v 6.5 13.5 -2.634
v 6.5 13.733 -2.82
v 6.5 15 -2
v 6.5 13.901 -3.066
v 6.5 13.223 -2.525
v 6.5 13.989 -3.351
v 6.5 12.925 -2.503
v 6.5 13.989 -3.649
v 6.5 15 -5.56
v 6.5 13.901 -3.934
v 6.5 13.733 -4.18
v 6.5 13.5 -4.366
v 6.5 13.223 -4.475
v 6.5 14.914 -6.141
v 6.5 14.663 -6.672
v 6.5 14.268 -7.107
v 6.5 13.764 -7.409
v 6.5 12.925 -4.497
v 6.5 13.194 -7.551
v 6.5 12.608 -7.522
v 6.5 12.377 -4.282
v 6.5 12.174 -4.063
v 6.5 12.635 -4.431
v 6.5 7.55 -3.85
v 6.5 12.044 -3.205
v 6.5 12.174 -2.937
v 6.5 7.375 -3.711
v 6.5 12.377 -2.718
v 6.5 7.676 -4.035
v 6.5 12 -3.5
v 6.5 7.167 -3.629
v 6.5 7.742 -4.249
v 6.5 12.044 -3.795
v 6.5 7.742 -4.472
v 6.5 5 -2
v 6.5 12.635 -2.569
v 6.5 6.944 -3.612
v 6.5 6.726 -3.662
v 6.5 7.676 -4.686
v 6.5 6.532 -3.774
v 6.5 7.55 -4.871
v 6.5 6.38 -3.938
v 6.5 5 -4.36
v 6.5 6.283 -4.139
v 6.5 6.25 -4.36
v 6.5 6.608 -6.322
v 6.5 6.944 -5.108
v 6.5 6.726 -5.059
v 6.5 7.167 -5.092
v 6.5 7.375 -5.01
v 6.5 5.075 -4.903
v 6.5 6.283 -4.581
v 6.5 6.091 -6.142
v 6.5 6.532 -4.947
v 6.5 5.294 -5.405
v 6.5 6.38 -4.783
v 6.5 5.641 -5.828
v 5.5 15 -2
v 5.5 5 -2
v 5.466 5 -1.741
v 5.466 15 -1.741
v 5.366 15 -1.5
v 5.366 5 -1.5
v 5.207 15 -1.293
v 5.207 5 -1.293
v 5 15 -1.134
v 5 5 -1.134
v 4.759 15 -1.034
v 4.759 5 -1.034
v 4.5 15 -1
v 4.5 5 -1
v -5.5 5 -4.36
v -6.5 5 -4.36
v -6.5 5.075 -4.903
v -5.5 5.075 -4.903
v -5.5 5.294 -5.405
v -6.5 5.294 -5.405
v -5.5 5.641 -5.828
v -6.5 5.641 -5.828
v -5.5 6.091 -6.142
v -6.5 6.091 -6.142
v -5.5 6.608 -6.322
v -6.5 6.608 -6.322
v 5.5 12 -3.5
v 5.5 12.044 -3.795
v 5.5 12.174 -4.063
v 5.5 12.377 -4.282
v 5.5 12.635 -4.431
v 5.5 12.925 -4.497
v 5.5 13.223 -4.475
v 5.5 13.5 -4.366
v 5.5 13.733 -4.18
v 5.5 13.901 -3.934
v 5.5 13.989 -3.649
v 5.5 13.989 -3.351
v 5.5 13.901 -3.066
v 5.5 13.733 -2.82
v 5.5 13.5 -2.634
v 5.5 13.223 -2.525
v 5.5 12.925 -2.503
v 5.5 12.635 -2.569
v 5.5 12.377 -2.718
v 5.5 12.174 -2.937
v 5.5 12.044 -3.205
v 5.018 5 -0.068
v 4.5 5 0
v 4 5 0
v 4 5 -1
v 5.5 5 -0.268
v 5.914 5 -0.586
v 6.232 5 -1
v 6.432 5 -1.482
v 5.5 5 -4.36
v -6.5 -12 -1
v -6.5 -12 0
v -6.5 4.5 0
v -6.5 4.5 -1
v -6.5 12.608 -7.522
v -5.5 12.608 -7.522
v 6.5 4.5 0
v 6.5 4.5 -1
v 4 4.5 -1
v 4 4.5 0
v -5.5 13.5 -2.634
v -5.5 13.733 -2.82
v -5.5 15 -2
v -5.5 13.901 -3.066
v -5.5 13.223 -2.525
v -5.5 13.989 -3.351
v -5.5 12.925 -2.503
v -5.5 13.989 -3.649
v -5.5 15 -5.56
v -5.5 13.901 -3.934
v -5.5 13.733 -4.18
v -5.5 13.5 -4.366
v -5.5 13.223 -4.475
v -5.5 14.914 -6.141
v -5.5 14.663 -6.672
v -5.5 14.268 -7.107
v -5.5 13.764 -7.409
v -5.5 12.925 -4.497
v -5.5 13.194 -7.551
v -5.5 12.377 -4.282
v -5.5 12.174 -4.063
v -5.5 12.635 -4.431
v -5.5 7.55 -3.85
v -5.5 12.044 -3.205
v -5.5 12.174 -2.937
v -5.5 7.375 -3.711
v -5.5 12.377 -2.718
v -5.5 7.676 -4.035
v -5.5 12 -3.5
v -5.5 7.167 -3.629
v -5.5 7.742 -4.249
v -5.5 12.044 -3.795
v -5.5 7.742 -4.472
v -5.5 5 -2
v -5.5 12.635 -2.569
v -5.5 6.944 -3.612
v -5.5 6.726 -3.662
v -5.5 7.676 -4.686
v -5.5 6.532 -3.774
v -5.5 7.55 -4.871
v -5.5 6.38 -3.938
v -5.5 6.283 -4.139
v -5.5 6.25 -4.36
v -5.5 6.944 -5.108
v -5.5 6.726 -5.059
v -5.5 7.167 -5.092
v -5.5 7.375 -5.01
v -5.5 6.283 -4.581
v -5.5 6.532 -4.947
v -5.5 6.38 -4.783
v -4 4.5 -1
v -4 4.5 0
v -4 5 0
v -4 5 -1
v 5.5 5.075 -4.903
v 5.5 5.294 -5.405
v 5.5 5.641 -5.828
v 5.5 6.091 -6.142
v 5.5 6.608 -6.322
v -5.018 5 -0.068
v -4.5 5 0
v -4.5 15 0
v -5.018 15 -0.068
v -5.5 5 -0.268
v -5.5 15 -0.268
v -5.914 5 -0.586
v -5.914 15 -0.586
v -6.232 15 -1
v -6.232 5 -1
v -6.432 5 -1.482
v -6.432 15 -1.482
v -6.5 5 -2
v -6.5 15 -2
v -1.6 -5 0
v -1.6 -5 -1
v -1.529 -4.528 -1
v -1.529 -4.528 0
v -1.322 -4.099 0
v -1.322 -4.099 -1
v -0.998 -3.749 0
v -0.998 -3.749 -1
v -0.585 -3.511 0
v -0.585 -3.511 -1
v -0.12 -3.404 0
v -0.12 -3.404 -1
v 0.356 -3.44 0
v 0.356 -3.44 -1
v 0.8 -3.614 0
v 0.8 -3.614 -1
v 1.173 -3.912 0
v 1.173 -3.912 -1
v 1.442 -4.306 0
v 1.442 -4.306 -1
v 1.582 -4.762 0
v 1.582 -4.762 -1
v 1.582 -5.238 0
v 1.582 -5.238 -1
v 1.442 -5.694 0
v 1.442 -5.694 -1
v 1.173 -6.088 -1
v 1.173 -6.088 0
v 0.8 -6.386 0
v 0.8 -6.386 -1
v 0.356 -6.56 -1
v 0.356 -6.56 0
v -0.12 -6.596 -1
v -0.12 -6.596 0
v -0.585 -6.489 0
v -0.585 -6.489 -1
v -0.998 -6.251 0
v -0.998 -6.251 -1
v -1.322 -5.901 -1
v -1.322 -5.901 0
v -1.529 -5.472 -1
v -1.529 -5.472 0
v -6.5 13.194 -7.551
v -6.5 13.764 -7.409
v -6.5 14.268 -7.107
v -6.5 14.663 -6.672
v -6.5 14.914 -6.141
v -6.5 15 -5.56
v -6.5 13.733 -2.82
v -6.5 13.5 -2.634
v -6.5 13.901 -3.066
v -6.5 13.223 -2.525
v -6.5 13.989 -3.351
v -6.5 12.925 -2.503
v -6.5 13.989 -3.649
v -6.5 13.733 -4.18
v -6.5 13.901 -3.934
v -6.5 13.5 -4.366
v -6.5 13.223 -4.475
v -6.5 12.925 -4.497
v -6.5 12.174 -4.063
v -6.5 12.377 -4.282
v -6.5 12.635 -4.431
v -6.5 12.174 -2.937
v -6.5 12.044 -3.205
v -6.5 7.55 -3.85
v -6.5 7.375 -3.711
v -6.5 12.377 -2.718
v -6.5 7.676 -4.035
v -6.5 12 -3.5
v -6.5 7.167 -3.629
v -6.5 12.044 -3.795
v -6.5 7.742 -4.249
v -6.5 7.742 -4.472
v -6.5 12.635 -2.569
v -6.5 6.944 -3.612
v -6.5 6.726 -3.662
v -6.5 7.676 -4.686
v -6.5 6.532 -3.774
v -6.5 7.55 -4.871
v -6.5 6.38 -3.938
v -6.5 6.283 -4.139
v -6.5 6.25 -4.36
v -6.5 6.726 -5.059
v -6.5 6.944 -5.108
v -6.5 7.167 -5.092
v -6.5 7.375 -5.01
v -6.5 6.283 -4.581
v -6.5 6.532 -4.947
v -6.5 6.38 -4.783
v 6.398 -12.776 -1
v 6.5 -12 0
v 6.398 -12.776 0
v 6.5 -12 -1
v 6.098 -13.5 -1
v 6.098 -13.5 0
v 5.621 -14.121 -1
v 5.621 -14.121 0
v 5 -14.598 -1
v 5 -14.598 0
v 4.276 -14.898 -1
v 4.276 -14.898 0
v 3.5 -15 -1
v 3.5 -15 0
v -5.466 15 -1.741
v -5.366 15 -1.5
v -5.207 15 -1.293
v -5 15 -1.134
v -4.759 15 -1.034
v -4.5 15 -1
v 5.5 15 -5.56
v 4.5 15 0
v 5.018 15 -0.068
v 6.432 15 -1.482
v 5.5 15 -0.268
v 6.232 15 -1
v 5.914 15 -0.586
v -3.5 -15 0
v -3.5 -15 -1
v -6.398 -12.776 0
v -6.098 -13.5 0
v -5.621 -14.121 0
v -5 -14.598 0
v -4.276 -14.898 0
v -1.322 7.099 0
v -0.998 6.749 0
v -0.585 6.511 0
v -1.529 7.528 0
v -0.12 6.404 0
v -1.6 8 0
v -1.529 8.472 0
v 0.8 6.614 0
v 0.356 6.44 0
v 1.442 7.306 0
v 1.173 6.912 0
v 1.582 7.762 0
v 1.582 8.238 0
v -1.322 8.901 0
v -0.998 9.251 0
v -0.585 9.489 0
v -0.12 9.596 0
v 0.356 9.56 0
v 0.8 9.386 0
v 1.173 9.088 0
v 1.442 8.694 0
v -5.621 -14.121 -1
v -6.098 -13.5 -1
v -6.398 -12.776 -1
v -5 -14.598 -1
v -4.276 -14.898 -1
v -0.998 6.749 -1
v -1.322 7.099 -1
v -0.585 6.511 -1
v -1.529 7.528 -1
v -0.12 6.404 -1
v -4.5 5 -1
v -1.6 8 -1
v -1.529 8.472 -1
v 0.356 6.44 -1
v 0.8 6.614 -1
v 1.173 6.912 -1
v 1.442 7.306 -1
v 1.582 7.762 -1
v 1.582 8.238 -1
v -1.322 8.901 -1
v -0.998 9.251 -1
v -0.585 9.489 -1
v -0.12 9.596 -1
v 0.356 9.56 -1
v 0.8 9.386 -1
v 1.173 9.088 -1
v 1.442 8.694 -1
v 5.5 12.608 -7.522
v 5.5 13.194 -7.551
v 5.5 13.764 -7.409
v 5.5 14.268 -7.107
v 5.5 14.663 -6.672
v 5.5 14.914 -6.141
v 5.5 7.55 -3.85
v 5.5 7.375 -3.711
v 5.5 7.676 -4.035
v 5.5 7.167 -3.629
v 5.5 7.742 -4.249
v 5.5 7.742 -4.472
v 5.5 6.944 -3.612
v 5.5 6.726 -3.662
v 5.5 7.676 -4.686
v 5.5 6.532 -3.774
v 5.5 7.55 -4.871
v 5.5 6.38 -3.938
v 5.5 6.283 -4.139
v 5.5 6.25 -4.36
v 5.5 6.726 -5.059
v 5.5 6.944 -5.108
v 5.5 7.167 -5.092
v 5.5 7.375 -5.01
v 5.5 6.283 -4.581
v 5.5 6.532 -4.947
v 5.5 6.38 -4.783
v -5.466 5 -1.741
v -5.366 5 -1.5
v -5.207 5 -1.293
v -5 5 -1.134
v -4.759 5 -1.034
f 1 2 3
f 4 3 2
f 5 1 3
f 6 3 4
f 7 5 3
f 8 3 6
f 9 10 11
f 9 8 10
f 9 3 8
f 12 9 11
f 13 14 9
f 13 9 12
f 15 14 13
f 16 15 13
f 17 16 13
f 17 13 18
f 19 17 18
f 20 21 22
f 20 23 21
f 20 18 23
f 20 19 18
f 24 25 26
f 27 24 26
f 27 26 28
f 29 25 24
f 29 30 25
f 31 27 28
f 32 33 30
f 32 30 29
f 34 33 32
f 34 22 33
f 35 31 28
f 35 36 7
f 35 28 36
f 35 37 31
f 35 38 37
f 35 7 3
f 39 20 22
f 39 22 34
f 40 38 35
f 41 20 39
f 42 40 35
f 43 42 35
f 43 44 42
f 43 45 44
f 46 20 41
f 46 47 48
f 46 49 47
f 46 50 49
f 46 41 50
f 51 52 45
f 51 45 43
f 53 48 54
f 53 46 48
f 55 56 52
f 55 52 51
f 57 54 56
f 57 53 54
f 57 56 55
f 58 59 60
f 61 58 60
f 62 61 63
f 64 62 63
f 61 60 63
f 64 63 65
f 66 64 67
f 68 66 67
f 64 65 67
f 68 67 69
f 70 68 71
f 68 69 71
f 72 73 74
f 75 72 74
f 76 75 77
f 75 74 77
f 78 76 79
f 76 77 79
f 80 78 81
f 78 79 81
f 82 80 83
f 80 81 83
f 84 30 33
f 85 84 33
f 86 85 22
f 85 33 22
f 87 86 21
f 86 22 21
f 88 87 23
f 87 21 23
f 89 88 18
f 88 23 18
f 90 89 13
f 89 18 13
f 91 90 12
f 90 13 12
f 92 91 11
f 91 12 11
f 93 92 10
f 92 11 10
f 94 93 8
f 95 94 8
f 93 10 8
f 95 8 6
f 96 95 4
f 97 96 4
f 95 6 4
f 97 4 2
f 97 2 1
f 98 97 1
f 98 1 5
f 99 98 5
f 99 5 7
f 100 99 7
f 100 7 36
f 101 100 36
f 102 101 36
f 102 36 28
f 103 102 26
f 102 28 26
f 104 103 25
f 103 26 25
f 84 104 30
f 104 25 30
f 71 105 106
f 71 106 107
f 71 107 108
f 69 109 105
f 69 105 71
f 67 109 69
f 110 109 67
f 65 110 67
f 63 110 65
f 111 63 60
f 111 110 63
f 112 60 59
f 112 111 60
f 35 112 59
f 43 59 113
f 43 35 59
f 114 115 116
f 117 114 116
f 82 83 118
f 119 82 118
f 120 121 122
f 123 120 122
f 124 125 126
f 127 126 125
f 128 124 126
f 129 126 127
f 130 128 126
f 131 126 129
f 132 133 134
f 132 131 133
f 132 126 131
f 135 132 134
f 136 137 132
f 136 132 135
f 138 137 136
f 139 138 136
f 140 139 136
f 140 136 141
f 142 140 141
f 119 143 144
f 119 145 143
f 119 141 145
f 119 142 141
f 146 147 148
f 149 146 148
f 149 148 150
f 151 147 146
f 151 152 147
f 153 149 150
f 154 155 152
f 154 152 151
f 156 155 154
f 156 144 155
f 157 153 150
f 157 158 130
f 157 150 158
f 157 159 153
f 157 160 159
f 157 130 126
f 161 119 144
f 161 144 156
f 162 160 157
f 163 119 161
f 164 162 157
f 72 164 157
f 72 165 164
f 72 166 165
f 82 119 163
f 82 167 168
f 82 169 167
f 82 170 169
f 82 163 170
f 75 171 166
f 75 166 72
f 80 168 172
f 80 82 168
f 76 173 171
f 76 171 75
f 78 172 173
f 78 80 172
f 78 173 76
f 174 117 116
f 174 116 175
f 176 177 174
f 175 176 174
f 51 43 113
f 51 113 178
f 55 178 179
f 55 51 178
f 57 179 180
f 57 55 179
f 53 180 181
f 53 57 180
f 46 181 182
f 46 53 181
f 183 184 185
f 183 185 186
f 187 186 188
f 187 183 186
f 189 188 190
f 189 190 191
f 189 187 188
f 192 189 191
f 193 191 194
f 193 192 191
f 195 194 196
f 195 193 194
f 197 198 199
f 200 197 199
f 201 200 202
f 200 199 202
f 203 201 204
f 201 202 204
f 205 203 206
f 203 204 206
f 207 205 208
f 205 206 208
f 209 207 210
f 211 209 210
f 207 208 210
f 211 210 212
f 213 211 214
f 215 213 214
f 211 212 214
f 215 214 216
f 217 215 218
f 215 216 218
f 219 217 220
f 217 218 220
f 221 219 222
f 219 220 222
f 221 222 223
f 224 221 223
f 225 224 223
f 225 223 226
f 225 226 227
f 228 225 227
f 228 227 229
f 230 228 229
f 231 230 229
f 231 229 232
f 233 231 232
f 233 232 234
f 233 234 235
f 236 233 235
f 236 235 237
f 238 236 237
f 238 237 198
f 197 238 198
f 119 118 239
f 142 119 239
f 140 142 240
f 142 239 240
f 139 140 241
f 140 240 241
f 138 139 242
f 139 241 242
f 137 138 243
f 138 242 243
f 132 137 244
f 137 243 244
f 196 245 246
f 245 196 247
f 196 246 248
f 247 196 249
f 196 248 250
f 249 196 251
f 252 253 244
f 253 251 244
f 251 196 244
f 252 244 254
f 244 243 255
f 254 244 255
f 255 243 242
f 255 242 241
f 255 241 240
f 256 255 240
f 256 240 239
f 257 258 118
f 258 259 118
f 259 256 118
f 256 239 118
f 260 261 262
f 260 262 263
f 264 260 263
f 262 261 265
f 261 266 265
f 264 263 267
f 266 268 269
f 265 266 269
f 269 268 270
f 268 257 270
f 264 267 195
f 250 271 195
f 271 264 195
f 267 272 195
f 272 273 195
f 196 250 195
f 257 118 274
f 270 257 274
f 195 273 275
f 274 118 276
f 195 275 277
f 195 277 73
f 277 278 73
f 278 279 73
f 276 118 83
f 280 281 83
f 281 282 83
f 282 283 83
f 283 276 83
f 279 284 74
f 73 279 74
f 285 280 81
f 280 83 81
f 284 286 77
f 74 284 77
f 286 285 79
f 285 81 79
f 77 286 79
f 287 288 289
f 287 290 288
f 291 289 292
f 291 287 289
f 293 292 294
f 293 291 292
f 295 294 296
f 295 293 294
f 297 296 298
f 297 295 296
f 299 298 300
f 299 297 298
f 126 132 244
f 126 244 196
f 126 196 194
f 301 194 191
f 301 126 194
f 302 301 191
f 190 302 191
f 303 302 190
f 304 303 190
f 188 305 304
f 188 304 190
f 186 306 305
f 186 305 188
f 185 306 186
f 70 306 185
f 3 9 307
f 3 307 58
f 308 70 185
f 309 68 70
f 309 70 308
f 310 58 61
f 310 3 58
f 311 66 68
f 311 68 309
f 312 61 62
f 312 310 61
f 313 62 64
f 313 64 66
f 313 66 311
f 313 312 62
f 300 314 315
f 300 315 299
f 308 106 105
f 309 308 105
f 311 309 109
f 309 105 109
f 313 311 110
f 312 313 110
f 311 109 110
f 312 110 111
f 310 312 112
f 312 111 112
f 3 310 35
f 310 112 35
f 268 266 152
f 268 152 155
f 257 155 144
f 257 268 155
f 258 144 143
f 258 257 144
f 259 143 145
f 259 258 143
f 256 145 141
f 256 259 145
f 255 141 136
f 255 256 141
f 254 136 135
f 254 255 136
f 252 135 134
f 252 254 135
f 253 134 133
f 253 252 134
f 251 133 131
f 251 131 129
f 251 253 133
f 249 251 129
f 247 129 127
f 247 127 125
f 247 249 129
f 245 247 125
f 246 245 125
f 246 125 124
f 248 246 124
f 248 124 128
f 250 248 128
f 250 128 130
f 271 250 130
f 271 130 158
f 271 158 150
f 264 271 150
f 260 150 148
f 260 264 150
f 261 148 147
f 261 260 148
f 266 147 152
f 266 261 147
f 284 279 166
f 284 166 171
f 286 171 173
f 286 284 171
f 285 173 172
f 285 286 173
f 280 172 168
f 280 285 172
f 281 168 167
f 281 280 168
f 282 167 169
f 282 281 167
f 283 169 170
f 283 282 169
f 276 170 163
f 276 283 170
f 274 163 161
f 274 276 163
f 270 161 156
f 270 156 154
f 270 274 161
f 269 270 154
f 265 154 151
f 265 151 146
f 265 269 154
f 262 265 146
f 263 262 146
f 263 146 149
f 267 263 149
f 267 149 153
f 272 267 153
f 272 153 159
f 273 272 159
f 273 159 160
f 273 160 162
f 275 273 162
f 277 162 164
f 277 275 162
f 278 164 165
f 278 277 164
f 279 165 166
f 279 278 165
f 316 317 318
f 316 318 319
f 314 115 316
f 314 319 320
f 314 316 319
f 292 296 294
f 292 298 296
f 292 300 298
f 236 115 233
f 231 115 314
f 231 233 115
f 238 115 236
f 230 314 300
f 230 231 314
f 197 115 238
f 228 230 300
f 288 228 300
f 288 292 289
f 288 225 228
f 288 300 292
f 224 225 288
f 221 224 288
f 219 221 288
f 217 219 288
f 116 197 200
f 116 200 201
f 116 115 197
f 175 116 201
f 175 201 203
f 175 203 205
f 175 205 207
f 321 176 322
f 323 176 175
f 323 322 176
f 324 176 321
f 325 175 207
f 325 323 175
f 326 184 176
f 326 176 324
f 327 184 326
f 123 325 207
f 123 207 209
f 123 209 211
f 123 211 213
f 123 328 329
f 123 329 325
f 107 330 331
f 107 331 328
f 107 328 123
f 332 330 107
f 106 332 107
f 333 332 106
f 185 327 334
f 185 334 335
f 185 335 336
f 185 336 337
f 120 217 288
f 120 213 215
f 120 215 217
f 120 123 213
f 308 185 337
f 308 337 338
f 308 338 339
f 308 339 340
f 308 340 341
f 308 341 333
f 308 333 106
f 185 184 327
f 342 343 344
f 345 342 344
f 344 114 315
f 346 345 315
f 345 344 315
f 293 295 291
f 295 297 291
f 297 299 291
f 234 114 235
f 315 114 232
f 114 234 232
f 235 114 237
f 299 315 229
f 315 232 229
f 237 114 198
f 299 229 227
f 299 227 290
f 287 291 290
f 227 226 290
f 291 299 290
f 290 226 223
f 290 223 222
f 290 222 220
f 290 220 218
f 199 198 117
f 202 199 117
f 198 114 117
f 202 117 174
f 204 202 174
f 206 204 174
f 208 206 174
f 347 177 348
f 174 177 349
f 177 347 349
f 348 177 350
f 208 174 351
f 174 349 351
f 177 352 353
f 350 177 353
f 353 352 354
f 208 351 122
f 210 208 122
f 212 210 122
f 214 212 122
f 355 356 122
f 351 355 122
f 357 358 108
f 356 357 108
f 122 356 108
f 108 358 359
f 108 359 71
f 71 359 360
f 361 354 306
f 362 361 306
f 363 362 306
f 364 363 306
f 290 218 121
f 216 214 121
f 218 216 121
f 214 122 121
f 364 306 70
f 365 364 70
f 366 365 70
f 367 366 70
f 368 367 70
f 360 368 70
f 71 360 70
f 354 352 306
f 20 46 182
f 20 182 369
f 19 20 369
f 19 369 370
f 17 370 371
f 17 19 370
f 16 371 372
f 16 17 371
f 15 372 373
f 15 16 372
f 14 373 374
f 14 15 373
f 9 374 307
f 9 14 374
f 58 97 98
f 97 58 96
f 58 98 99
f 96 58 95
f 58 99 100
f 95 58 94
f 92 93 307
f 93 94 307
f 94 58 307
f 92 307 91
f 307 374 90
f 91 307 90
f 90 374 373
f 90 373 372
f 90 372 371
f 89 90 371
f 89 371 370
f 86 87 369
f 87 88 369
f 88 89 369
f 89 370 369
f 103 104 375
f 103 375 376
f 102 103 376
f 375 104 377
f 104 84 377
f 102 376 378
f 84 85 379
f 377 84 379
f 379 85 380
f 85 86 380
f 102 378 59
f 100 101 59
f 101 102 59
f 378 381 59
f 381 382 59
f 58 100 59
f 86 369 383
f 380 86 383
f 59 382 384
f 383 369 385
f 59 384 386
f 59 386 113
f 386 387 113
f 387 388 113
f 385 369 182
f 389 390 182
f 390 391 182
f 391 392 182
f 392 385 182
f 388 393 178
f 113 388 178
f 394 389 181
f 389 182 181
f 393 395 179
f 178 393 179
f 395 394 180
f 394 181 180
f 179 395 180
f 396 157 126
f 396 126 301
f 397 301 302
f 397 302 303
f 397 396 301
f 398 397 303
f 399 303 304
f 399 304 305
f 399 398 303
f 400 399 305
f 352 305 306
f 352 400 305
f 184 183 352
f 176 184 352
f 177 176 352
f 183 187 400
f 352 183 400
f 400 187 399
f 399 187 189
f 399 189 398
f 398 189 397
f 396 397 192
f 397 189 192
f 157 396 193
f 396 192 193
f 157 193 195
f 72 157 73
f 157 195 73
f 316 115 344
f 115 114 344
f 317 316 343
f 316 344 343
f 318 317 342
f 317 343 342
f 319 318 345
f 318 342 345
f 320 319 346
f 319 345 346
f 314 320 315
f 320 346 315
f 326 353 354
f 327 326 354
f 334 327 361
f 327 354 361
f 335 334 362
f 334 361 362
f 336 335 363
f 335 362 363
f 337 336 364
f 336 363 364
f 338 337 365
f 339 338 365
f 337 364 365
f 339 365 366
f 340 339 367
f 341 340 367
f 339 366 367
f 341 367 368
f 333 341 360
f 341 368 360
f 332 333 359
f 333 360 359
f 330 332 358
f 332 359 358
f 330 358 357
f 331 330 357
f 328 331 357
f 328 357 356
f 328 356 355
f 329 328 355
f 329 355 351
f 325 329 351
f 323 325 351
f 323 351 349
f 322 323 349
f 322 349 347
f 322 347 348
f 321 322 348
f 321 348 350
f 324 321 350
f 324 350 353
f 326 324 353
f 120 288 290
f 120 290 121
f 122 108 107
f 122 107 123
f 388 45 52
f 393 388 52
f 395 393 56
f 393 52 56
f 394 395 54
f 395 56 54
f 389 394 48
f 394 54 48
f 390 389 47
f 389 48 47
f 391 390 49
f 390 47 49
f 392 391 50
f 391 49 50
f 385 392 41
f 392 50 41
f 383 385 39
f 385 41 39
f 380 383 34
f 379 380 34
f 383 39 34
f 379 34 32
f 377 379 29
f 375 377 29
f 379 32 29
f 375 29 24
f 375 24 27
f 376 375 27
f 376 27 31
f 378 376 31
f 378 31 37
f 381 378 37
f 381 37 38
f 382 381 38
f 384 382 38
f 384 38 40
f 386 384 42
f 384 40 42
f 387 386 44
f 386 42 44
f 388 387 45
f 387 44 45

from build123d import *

# Parameters (mm, degrees)
SKETCH_1_W                        = 13
SKETCH_1_H                        = 30
SM_BASE_FLANGE_1_DEPTH            = 1
SM_EDGE_FLANGE_1_STRIP_W          = 6
SM_EDGE_FLANGE_1_STRIP_H          = 1
SM_EDGE_FLANGE_1_STRIP_CUT_DEPTH  = 10
SM_EDGE_FLANGE_1_RELIEF_W         = 6.5
SM_EDGE_FLANGE_1_RELIEF_H         = 0.5
SM_EDGE_FLANGE_1_RELIEF_CUT_DEPTH = 1
SM_EDGE_FLANGE_1_DEPTH            = 10
SM_EDGE_FLANGE_1_PROFILE_R        = 1
SM_EDGE_FLANGE_1_PROFILE_R_2      = 0.75
SM_EDGE_FLANGE_1_FLAT_DEPTH       = 1
FILLET_1_R                        = 3
SKETCH_9_R                        = 1.6
CUT_EXTRUDE_1_DEPTH               = 18.615014781


# Sheet-metal steps are written as plain solids
with BuildPart() as part:
    # Sketch 1 → 基体-法兰1 (new body)
    with BuildSketch(Plane.XY):
        Rectangle(SKETCH_1_W, SKETCH_1_H)
    extrude(amount=-SM_BASE_FLANGE_1_DEPTH)

    # 边线-法兰1 strip (across the edge) → 边线-法兰1 strip cut (cut)
    with BuildSketch(Plane(origin=(-6.5, 5, -1), x_dir=(1, 0, 0), z_dir=(0, 1, 0))):
        with Locations((-1, -0.5)):
            Rectangle(SM_EDGE_FLANGE_1_STRIP_W, SM_EDGE_FLANGE_1_STRIP_H)
    sm_edge_flange_1_strip_cut = extrude(amount=SM_EDGE_FLANGE_1_STRIP_CUT_DEPTH, mode=Mode.SUBTRACT)

    # 边线-法兰1 relief (on the sheet) → 边线-法兰1 relief cut (cut)
    with BuildSketch(Plane(origin=(-4.5, 5, -1), x_dir=(1, 0, 0), z_dir=(0, 0, -1))):
        with Locations((-2.75, 0.25)):
            Rectangle(SM_EDGE_FLANGE_1_RELIEF_W, SM_EDGE_FLANGE_1_RELIEF_H)
    sm_edge_flange_1_relief_cut = extrude(amount=-SM_EDGE_FLANGE_1_RELIEF_CUT_DEPTH, mode=Mode.SUBTRACT)

    # 边线-法兰1 bend section (across the edge) → 边线-法兰1 (add)
    with BuildSketch(Plane(origin=(-6.5, 5, -1), x_dir=(1, 0, 0), z_dir=(0, 1, 0))):
        with BuildLine():
            Line((0, 1), (1, 1))
            ThreePointArc((1, 1), (1.292893219, 0.292893219), (2, 0))
            Line((2, 0), (2, -1))
            ThreePointArc((2, -1), (0.585786438, -0.414213562), (0, 1))
        make_face()
    sm_edge_flange_1 = extrude(amount=SM_EDGE_FLANGE_1_DEPTH)

    # 边线-法兰1 profile (on flange) → 边线-法兰1 flat (add)
    with BuildSketch(Plane(origin=(-6.5, 0, -1), x_dir=(0, -1, 0), z_dir=(1, 0, 0))):
        with BuildLine():
            Line((-15, 1), (-5, 1))
            Line((-5, 1), (-5, 3.360392195))
            ThreePointArc((-5, 3.360392195), (-5.453315717, 4.628370006), (-6.60776773, 5.321553546))
            Line((-6.60776773, 5.321553546), (-12.60776773, 6.521553546))
            ThreePointArc((-12.60776773, 6.521553546), (-14.267977811, 6.107076477), (-15, 4.560392195))
            Line((-15, 4.560392195), (-15, 1))
        make_face()
        with Locations((-13, 2.5)):
            Circle(SM_EDGE_FLANGE_1_PROFILE_R, mode=Mode.SUBTRACT)
        with Locations((-7, 3.360392195)):
            Circle(SM_EDGE_FLANGE_1_PROFILE_R_2, mode=Mode.SUBTRACT)
    sm_edge_flange_1_flat = extrude(amount=SM_EDGE_FLANGE_1_FLAT_DEPTH)

    # 镜向1: 边线-法兰1 strip cut, 边线-法兰1 relief cut, 边线-法兰1, 边线-法兰1 flat across plane
    add(sm_edge_flange_1_strip_cut.mirror(Plane(origin=(0, 0, 0), x_dir=(0, 0, 1), z_dir=(1, 0, 0))), mode=Mode.SUBTRACT)
    add(sm_edge_flange_1_relief_cut.mirror(Plane(origin=(0, 0, 0), x_dir=(0, 0, 1), z_dir=(1, 0, 0))), mode=Mode.SUBTRACT)
    add(sm_edge_flange_1.mirror(Plane(origin=(0, 0, 0), x_dir=(0, 0, 1), z_dir=(1, 0, 0))))
    add(sm_edge_flange_1_flat.mirror(Plane(origin=(0, 0, 0), x_dir=(0, 0, 1), z_dir=(1, 0, 0))))

    # 圆角1
    fillet_1_edges = [part.edges().sort_by_distance(p)[0] for p in [
        (6.5, -15, -0.5),
        (-6.5, -15, -0.5),
    ]]
    fillet(fillet_1_edges, radius=FILLET_1_R)

    # 草图9 → 切除-拉伸1 (cut, through all)
    with BuildSketch(Plane(origin=(0, 0, -1), x_dir=(-1, 0, 0), z_dir=(0, 0, -1))):
        with Locations((0, 8)):
            Circle(SKETCH_9_R)
        with Locations((0, -5)):
            Circle(SKETCH_9_R)
    extrude(amount=-CUT_EXTRUDE_1_DEPTH, mode=Mode.SUBTRACT)


solid = part.part
